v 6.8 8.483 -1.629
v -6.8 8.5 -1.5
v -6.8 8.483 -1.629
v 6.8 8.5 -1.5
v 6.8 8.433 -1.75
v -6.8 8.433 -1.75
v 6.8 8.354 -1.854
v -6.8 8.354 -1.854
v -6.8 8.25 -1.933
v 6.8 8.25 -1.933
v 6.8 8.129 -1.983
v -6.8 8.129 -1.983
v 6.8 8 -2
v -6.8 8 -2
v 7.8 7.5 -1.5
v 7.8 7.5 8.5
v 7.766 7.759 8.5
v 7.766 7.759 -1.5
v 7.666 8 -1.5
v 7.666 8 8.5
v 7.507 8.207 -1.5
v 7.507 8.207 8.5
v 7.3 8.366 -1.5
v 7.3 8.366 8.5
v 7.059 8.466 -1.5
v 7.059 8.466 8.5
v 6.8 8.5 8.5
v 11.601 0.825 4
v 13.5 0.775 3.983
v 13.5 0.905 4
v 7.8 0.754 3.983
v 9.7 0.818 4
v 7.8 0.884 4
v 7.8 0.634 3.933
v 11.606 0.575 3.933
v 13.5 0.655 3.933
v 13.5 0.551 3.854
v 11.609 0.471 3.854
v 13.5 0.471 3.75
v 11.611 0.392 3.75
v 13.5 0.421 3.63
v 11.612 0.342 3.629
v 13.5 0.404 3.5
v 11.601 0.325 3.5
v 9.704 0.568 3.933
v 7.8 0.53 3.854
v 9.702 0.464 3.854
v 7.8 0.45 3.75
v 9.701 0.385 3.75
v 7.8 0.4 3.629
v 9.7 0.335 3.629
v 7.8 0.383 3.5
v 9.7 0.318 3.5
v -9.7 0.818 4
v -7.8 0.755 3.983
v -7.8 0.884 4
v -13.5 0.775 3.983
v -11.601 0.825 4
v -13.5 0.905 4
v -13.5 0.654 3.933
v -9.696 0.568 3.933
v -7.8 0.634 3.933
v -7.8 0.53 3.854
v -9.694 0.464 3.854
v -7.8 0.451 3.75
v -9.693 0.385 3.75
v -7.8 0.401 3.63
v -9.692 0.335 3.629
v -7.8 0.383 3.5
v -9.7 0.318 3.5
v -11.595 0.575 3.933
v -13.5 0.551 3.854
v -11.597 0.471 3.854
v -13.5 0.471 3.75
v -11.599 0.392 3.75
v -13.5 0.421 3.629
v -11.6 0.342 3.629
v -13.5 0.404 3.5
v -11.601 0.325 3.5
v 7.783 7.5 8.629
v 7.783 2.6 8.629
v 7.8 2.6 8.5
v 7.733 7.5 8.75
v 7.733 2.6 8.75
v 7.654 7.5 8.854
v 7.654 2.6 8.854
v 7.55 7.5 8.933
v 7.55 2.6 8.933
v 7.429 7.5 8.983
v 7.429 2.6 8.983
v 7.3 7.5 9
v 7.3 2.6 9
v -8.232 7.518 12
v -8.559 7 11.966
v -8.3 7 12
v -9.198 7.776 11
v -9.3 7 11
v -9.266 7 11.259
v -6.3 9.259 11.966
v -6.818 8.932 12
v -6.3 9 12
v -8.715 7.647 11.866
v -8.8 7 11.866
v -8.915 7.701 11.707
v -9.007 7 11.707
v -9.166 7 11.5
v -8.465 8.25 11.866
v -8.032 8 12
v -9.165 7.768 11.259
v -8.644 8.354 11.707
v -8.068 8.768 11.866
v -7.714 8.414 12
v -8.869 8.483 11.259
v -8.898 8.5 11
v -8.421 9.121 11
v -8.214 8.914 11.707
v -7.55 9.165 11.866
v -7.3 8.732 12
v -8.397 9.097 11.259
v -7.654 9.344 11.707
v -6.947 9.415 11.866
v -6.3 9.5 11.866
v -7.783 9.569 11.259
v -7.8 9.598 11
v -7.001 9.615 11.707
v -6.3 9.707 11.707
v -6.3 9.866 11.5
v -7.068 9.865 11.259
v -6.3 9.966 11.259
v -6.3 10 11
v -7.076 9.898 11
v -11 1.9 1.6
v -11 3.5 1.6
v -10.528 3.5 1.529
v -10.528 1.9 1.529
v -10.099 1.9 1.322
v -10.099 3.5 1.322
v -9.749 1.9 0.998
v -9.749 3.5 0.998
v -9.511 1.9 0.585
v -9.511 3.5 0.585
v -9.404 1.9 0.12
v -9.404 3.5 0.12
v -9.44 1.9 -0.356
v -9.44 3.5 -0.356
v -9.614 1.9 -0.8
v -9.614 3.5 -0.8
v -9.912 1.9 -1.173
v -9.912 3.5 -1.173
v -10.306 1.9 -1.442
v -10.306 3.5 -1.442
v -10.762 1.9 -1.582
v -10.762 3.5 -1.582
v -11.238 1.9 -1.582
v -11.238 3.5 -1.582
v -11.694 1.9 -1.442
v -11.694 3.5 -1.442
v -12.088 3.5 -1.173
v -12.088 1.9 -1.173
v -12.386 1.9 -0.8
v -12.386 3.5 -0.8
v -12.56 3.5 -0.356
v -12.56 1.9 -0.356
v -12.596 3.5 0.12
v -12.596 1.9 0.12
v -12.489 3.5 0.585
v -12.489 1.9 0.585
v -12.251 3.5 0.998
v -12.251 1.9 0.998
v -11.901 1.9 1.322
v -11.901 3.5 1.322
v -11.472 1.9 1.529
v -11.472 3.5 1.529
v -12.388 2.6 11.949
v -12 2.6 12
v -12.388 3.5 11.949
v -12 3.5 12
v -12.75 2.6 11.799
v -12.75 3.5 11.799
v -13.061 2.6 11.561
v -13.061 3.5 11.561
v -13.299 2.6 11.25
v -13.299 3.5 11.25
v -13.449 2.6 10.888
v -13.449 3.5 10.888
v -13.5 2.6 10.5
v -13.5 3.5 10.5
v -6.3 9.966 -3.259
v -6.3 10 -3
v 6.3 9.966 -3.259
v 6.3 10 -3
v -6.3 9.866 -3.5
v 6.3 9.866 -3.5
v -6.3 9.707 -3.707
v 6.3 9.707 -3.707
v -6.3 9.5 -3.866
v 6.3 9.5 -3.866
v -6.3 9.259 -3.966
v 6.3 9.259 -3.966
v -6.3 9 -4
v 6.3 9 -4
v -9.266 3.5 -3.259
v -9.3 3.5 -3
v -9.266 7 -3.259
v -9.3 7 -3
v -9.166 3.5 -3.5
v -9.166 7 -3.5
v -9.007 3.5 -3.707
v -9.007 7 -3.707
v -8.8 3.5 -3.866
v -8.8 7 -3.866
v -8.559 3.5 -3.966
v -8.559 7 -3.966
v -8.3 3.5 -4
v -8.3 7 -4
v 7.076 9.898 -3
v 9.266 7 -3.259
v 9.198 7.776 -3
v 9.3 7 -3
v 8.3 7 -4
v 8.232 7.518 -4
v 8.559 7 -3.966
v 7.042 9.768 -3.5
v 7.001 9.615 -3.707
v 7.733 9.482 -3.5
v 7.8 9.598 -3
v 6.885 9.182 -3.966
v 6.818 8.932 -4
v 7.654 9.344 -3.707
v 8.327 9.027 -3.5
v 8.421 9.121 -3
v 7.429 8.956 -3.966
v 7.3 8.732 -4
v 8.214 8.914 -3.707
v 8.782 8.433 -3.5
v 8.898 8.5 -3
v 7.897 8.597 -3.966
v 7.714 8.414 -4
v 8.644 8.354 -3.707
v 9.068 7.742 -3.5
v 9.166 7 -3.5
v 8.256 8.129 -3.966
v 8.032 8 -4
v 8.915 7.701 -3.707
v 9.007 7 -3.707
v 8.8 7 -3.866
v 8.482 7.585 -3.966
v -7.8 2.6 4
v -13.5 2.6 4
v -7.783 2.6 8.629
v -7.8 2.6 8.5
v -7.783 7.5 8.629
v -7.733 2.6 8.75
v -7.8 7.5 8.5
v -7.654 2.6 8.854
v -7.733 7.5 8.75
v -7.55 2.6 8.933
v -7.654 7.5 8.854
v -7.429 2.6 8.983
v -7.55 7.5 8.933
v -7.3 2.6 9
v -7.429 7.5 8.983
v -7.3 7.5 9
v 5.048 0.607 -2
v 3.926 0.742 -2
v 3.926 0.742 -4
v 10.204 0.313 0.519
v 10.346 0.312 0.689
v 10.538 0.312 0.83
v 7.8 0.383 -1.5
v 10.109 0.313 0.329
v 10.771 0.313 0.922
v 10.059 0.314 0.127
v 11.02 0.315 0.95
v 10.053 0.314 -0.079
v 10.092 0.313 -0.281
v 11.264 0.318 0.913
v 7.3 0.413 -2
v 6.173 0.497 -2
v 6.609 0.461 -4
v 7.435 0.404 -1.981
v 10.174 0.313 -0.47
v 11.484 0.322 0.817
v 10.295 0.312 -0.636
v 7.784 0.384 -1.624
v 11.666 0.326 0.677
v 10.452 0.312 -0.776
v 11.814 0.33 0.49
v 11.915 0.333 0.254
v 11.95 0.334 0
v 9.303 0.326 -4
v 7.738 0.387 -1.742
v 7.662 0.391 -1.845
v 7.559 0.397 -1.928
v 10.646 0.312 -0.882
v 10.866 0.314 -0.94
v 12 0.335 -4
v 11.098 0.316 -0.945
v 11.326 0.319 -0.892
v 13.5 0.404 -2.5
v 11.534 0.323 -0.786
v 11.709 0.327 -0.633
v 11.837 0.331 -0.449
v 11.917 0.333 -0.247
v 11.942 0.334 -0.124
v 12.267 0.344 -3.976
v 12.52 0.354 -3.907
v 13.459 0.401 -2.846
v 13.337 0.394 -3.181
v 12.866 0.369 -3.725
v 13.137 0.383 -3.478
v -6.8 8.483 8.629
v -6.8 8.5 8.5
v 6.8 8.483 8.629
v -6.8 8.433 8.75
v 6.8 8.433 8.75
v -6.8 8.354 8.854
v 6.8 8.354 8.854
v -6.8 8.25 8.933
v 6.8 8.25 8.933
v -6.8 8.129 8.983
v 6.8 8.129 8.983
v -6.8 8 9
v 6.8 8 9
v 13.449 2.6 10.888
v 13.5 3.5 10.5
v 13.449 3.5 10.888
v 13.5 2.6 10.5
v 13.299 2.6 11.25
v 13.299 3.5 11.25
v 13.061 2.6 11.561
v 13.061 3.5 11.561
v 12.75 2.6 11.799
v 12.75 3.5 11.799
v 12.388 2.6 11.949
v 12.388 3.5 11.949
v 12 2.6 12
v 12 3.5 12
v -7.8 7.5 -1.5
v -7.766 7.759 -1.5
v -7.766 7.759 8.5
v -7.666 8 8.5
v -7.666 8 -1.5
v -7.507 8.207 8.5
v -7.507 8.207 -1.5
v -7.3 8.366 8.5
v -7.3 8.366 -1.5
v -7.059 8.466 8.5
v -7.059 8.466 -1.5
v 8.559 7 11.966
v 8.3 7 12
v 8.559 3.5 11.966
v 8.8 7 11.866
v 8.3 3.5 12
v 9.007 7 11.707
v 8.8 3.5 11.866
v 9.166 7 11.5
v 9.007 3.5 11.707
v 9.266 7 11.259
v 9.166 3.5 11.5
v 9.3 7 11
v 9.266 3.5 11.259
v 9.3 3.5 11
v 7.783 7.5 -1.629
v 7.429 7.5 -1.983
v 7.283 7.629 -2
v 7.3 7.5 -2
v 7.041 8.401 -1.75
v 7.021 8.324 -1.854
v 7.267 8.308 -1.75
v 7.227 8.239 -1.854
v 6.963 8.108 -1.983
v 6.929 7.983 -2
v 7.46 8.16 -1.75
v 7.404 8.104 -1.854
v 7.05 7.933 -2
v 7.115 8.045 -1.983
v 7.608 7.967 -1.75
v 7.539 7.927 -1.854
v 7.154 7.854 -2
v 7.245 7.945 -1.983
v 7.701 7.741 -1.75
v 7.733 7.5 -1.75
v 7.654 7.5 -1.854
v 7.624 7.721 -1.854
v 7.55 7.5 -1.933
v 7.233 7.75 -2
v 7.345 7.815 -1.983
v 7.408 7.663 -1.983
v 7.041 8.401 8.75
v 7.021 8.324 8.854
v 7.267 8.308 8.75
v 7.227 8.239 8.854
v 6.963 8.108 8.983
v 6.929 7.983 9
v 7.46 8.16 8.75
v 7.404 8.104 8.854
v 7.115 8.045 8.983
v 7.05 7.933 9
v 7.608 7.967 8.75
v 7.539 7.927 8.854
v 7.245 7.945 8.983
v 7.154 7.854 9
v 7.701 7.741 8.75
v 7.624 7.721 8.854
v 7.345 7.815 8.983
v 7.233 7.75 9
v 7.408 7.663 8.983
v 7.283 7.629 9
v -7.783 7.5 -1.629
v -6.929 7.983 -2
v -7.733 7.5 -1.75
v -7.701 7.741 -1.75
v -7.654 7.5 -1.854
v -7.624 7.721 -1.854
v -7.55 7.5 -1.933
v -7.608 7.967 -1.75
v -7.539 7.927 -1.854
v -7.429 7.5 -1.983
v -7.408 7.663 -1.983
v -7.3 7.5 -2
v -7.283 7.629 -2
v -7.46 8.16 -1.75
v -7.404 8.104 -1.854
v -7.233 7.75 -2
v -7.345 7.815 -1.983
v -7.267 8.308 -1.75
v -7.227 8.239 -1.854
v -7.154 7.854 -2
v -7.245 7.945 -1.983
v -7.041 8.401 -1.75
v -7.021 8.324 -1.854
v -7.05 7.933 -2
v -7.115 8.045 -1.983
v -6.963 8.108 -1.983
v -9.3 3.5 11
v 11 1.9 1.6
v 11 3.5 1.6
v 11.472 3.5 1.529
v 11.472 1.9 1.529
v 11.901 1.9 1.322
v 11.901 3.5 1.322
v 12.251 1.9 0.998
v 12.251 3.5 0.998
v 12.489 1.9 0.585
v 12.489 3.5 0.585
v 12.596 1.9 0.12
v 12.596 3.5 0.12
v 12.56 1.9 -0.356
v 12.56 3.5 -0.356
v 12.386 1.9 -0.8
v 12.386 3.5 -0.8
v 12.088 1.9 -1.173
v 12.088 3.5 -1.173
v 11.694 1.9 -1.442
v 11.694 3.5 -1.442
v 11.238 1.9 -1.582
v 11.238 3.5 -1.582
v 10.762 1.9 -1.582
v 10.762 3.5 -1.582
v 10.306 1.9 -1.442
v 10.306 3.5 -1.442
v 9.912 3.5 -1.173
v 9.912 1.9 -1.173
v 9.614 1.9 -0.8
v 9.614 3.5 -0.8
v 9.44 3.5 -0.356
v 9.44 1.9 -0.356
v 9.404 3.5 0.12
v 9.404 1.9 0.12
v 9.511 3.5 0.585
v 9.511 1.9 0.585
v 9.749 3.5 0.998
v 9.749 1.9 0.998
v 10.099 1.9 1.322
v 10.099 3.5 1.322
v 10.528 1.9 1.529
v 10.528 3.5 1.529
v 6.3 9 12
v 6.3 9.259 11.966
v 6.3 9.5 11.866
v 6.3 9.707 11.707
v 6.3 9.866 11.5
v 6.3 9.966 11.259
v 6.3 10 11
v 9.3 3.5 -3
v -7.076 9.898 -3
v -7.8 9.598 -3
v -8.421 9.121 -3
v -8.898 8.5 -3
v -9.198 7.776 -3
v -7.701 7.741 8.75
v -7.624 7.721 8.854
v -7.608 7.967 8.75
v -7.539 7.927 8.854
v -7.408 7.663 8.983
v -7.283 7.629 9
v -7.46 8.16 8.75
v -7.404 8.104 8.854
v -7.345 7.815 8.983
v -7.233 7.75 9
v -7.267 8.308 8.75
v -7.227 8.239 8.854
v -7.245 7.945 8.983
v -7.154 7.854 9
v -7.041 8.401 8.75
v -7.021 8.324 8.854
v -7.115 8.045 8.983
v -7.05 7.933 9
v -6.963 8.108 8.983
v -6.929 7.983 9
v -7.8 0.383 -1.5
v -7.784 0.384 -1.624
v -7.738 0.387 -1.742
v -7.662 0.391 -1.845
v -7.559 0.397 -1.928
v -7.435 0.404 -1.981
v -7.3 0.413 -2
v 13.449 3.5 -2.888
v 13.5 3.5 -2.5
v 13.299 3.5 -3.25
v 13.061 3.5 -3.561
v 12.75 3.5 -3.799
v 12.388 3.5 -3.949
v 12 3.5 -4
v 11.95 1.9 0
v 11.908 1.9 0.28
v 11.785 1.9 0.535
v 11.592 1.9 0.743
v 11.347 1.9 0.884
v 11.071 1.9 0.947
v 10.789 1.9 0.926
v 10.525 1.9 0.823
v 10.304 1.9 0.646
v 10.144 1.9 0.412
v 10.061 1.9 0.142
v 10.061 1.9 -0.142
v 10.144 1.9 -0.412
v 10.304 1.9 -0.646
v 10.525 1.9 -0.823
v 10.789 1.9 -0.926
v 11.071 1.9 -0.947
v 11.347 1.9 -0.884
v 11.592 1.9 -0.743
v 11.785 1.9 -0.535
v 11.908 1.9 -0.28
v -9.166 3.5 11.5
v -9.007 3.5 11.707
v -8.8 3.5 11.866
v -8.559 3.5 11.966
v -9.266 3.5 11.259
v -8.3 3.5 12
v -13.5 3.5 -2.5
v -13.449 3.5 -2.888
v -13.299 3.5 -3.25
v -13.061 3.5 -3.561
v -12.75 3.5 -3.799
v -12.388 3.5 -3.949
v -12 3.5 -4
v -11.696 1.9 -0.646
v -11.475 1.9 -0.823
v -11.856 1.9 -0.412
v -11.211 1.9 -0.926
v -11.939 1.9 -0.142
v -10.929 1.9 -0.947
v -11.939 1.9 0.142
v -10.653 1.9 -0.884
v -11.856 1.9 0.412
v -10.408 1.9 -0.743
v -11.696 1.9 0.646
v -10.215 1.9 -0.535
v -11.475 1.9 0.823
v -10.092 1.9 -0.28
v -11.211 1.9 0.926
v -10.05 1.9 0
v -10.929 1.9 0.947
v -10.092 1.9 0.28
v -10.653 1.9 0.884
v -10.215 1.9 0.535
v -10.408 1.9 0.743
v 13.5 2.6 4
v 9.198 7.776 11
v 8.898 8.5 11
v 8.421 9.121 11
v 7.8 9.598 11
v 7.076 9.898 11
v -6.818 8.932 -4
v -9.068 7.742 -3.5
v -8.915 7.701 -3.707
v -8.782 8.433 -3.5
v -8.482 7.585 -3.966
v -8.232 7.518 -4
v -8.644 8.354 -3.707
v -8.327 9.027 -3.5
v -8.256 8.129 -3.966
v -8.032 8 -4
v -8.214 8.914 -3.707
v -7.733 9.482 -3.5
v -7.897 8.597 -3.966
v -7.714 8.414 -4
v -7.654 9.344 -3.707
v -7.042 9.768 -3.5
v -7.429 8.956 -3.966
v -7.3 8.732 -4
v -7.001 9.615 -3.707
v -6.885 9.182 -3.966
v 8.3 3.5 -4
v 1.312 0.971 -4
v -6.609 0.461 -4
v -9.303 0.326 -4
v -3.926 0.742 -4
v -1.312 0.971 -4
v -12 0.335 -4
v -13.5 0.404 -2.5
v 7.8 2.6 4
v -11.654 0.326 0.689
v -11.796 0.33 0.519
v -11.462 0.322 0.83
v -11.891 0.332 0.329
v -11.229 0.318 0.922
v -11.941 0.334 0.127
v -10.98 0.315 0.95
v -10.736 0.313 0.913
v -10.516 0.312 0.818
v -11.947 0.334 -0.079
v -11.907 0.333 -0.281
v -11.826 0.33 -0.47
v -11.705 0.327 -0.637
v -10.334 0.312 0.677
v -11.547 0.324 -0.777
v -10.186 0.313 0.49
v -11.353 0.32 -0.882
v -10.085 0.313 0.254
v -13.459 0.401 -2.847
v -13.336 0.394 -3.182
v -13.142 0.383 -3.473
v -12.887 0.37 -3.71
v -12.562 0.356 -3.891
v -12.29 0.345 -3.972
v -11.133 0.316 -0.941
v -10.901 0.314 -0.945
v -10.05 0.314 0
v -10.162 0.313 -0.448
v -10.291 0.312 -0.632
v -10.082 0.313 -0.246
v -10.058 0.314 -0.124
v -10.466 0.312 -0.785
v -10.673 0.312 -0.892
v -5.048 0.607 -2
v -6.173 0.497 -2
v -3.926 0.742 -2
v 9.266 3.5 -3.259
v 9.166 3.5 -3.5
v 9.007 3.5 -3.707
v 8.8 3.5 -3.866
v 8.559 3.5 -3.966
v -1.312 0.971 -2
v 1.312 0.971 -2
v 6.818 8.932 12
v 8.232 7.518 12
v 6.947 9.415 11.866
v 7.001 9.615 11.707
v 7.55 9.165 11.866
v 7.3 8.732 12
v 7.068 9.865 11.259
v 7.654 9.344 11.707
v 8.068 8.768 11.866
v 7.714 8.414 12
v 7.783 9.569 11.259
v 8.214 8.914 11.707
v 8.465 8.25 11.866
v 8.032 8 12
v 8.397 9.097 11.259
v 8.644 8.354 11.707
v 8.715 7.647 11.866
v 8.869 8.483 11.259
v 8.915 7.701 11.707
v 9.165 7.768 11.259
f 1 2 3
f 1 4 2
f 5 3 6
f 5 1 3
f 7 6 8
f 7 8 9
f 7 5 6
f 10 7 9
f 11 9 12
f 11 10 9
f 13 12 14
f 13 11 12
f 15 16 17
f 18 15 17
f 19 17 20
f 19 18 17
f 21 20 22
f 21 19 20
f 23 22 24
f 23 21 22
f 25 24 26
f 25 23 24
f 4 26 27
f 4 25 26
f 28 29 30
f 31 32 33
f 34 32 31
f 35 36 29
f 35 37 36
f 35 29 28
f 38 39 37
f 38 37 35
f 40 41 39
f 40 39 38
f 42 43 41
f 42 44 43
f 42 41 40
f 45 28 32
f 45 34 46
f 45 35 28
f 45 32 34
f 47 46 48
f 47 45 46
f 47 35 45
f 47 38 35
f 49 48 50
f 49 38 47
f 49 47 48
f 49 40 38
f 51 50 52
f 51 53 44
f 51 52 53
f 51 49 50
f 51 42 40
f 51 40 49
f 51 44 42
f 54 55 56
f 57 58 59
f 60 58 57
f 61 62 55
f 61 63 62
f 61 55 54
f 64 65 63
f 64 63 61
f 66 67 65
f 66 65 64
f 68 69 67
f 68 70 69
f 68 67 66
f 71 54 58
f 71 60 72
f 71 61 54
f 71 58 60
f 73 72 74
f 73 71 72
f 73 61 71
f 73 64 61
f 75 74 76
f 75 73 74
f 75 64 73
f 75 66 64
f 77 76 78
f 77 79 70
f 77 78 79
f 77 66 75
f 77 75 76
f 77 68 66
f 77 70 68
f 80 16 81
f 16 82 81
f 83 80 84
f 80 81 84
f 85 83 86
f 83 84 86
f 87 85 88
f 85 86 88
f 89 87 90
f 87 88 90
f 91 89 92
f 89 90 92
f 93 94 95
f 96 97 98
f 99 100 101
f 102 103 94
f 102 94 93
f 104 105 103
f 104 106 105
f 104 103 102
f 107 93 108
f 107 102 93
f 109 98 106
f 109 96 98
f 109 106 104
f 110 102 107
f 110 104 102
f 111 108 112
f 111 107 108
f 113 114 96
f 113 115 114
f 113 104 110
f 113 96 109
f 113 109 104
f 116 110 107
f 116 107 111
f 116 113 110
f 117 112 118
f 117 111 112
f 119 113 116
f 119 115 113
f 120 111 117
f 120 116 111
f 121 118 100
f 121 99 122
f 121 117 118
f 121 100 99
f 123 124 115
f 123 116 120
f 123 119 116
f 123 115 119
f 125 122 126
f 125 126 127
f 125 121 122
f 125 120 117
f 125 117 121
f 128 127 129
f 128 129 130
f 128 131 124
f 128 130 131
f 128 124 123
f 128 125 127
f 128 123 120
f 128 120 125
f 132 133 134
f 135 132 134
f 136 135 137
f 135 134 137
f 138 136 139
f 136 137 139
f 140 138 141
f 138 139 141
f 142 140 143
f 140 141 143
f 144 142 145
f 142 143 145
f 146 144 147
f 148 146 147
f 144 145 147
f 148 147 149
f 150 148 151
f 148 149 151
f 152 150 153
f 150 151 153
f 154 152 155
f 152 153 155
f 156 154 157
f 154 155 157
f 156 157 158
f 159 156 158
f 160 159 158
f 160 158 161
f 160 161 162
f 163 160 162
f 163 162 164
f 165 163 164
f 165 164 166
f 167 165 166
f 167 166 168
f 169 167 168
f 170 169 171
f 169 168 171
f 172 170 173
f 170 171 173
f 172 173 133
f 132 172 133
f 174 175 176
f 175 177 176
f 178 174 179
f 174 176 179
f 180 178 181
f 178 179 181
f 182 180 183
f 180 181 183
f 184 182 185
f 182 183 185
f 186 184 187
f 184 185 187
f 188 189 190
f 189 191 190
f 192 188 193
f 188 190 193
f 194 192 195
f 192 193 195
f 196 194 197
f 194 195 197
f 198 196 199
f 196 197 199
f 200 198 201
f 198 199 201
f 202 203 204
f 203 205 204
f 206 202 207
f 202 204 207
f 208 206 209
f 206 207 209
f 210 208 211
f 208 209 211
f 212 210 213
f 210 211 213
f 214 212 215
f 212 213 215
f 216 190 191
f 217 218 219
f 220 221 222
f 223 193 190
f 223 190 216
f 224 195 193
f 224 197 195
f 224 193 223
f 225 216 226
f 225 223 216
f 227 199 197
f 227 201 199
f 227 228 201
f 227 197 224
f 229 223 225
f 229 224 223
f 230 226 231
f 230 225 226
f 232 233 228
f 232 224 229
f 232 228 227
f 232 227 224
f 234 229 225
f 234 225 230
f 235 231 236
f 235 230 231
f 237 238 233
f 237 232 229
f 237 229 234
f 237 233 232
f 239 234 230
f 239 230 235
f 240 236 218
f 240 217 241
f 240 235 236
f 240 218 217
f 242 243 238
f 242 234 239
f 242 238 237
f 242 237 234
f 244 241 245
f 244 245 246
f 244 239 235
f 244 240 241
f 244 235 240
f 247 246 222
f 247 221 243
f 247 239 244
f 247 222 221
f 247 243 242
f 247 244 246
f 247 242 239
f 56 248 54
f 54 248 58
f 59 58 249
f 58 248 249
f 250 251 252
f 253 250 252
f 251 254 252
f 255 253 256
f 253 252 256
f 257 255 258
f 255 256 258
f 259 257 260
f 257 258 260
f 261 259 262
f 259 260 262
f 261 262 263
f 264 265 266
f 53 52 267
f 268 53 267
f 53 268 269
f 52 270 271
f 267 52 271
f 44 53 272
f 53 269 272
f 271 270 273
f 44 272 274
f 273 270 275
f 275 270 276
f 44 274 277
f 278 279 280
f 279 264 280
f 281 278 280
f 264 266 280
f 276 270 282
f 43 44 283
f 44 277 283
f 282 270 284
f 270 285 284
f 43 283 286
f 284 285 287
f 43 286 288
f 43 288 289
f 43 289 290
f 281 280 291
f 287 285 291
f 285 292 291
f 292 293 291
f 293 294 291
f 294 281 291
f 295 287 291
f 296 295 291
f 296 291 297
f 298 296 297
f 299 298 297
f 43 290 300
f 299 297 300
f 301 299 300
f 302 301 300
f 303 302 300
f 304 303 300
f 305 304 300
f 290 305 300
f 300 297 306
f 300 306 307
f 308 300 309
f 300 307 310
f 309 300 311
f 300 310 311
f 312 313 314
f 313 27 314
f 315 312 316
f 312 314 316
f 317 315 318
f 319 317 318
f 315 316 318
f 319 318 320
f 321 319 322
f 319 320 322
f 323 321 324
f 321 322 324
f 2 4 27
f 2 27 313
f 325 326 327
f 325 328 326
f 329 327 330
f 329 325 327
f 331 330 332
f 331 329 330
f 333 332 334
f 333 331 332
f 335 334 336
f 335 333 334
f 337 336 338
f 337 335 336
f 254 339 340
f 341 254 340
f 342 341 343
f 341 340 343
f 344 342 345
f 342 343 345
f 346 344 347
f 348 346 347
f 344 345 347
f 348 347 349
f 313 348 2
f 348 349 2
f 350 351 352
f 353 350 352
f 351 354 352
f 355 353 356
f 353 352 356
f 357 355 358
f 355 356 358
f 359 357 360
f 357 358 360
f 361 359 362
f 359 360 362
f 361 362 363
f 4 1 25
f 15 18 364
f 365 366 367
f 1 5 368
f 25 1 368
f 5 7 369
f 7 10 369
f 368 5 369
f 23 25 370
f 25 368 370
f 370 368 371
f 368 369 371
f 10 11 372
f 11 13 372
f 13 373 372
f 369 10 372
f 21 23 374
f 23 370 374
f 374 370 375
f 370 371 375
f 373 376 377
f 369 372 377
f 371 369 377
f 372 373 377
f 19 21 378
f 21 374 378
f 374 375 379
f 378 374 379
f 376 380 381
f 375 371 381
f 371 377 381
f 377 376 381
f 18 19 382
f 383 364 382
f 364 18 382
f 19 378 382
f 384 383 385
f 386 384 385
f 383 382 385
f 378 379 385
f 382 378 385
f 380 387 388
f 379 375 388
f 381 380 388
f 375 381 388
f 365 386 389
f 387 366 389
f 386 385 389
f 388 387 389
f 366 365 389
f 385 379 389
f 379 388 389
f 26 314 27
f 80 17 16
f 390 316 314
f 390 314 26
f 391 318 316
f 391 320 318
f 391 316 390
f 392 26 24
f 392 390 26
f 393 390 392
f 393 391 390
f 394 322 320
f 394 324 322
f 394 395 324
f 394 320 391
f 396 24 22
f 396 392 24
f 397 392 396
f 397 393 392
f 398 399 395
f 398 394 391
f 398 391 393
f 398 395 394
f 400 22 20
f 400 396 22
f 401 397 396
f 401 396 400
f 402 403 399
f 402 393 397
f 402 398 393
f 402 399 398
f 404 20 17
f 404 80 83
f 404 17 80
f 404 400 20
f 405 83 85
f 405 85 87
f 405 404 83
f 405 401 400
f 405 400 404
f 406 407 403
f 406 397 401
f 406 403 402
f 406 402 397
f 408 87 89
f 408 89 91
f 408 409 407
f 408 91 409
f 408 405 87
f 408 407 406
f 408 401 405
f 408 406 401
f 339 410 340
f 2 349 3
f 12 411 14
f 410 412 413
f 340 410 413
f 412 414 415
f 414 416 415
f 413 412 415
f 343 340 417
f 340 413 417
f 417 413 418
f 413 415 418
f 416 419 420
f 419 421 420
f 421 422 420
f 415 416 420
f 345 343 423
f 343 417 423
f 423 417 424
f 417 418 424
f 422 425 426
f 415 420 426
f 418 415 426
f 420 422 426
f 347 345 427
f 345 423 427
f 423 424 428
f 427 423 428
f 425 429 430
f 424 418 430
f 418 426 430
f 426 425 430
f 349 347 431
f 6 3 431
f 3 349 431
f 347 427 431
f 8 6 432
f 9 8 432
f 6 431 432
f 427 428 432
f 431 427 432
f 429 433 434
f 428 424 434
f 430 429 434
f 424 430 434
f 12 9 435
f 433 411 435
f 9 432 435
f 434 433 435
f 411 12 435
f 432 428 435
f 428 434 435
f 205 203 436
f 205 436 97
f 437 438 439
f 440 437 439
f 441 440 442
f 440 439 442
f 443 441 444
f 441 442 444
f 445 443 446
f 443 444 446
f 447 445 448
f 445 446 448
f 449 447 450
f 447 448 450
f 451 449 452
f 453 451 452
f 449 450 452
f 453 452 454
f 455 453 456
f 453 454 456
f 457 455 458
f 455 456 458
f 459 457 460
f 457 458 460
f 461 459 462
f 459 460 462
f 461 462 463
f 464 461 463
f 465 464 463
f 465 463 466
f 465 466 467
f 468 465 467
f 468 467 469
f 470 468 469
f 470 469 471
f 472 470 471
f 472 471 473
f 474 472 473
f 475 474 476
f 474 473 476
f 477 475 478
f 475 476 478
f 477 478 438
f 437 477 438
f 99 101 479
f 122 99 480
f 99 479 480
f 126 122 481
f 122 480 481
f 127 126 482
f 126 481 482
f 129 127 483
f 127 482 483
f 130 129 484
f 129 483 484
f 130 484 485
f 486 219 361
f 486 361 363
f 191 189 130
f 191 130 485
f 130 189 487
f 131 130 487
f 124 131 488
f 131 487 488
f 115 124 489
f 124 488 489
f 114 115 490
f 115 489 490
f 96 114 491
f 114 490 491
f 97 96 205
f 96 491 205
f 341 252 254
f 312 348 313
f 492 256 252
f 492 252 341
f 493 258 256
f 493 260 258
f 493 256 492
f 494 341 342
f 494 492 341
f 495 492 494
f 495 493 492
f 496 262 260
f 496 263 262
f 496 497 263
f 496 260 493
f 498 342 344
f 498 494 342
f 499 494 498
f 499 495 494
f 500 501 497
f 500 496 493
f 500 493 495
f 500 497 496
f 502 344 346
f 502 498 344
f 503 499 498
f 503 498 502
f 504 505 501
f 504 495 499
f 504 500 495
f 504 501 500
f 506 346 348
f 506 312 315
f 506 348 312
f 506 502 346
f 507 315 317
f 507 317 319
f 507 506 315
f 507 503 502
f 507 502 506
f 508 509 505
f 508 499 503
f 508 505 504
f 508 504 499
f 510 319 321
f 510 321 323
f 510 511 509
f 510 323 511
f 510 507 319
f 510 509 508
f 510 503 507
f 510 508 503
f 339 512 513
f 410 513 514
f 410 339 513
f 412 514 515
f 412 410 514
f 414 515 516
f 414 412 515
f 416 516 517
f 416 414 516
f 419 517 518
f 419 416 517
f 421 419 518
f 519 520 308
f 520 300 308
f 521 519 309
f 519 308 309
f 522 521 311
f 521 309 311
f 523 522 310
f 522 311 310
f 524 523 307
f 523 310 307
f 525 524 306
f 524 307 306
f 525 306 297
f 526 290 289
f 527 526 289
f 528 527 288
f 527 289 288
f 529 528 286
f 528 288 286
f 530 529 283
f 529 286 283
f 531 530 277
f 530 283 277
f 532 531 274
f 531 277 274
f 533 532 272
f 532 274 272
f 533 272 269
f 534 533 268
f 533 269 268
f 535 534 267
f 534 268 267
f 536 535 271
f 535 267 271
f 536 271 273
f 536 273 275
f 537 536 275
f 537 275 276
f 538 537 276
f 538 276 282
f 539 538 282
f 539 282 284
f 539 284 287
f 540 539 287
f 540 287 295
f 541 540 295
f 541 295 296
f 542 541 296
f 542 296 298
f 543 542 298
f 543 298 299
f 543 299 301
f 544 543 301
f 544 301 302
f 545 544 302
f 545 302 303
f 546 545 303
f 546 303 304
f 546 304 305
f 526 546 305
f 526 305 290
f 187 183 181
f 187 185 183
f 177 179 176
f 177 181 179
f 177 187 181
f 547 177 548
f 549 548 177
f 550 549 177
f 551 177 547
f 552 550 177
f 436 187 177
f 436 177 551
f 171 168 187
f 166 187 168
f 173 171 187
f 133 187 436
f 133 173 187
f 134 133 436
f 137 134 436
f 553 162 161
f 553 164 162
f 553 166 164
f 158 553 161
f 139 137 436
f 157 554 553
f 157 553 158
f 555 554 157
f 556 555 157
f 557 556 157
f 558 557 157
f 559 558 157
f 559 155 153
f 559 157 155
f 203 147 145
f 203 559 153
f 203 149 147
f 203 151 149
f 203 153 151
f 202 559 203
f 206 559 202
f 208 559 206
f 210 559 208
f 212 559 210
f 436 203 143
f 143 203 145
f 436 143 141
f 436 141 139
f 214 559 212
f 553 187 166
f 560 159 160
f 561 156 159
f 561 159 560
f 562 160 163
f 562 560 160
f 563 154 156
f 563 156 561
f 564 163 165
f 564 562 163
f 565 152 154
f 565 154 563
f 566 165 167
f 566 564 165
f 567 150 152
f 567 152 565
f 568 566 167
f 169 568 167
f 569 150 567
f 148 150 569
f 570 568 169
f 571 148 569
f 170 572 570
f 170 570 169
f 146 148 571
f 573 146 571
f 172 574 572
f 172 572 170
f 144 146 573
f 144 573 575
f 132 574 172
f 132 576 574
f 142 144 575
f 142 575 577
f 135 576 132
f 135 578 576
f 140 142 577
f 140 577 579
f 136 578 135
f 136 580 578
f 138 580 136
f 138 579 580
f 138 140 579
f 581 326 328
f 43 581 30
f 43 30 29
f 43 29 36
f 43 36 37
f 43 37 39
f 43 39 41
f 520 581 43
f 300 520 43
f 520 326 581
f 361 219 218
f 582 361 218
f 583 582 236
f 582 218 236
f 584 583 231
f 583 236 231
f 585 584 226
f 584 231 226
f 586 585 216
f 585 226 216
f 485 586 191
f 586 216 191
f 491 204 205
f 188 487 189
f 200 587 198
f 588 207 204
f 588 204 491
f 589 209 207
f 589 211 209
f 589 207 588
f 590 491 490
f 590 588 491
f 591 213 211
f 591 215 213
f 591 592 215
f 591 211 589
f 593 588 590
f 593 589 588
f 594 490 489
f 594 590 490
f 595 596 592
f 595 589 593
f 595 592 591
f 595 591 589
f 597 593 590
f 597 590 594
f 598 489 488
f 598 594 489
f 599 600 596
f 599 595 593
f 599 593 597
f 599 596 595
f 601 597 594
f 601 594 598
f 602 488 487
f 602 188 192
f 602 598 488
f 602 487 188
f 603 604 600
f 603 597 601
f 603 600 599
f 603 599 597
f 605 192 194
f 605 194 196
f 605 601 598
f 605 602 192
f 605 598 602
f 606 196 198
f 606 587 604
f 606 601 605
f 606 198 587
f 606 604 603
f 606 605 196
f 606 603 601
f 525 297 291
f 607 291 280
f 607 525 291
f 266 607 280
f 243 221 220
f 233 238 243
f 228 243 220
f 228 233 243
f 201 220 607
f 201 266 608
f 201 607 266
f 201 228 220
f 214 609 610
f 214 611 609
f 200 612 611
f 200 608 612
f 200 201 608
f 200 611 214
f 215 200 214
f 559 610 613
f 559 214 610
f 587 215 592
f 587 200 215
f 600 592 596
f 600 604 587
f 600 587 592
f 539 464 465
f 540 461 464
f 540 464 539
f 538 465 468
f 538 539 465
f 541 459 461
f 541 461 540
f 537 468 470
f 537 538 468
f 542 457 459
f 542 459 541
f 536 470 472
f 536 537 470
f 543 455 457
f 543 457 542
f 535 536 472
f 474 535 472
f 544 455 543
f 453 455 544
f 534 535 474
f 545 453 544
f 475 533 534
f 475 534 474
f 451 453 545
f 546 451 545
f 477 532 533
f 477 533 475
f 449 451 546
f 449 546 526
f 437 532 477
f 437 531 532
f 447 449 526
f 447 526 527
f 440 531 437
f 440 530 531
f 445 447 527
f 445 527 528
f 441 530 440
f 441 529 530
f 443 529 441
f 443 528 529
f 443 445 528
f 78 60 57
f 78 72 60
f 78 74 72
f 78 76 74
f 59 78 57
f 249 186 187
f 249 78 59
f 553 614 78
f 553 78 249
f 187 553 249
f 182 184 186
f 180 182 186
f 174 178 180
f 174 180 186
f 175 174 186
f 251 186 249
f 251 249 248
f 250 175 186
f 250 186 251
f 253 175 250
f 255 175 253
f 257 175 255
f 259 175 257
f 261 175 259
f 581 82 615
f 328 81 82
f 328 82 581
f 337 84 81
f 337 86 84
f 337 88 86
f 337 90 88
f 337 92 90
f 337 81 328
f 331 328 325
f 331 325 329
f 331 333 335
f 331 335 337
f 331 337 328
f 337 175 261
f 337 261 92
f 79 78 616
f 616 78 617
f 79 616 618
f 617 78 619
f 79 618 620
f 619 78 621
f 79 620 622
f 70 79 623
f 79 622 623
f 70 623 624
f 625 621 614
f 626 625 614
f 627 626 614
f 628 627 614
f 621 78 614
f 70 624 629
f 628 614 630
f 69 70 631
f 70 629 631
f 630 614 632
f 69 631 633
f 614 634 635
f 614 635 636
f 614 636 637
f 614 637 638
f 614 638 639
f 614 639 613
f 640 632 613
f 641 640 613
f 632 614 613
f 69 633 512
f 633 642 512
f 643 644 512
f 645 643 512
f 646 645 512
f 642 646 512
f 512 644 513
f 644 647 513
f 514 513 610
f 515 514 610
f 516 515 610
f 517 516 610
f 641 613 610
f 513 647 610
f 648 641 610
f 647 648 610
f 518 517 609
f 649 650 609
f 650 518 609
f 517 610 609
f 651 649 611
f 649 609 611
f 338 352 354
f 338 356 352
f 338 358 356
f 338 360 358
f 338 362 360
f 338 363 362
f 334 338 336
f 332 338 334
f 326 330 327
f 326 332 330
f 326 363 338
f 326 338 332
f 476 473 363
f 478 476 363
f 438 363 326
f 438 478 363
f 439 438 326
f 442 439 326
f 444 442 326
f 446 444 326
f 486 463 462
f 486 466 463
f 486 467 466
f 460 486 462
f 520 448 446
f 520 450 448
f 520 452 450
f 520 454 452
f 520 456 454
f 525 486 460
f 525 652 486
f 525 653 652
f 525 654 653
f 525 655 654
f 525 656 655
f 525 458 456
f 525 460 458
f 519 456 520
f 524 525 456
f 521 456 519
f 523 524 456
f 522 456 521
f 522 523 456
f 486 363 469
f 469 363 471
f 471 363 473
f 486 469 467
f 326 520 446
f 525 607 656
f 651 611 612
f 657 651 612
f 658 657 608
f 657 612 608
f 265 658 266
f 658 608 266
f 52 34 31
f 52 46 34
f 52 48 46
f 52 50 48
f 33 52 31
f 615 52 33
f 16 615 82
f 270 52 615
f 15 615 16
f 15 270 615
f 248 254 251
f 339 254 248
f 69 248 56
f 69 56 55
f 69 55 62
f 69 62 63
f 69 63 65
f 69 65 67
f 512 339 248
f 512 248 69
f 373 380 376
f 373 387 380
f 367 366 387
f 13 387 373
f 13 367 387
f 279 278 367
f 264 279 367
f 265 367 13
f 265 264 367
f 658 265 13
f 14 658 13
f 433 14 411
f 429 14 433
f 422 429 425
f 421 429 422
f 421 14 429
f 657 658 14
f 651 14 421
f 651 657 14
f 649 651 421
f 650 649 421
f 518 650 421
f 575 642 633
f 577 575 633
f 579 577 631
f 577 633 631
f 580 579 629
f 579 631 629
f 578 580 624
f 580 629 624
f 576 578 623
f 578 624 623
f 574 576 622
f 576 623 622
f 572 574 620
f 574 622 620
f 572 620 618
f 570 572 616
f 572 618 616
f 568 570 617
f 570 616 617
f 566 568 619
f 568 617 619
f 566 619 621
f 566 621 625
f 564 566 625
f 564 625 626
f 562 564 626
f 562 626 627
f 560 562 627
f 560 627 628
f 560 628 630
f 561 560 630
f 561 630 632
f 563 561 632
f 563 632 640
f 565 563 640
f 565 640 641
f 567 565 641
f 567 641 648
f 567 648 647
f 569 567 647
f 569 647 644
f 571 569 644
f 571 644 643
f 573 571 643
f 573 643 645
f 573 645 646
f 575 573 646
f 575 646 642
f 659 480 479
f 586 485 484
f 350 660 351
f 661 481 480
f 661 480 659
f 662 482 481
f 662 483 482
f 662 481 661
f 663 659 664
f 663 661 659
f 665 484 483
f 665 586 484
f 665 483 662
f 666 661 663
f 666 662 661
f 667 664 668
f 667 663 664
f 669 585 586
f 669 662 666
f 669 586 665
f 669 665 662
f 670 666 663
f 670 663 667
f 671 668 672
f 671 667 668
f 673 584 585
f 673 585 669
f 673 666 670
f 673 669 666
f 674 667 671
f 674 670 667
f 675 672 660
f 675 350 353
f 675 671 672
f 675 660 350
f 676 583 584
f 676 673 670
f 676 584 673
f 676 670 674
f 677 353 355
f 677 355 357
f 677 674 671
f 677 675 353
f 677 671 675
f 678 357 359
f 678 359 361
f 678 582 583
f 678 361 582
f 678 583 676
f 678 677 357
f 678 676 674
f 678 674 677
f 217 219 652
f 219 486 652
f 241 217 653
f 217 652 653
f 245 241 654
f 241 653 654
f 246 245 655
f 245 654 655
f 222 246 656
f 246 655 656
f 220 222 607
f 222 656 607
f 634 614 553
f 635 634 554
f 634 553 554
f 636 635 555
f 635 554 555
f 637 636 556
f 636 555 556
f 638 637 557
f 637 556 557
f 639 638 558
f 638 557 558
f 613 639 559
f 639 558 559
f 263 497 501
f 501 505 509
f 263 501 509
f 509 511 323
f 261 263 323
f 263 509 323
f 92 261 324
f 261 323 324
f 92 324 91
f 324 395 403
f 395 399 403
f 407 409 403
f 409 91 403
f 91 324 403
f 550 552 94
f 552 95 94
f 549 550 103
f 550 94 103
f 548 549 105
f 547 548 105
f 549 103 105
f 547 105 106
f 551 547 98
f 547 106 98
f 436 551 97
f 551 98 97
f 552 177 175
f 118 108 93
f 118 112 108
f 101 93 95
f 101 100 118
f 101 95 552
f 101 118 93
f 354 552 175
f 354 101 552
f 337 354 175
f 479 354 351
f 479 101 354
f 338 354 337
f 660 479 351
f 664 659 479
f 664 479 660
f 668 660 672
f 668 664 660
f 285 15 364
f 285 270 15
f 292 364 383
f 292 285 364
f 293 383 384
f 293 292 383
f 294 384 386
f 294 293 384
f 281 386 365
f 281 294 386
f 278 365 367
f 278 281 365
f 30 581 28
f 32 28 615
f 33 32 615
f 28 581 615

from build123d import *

# Parameters (mm, degrees)
EXTRUDE_1_DEPTH     = 4
CUT_EXTRUDE_1_REACH = 19.27
SKETCH_2_R          = 0.95
SKETCH_5_W          = 15.6
SKETCH_5_H          = 6
CUT_EXTRUDE_2_DEPTH = 8.5
CUT_EXTRUDE_4_DEPTH = 19.607794066
EXTRUDE_2_DEPTH     = 8
SKETCH_12_W         = 15.6
SKETCH_12_H         = 3
EXTRUDE_3_DEPTH     = 5.9
SKETCH_13_R         = 1.6
CUT_EXTRUDE_5_DEPTH = 1.6
FILLET_1_R          = 3
FILLET_2_R          = 1
FILLET_3_R          = 1.5
FILLET_4_R          = 1
FILLET_5_R          = 0.5
FILLET_6_R          = 0.5


with BuildPart() as part:
    # 草图1 → 凸台-拉伸1 (new, symmetric)
    with BuildSketch(Plane.XY):
        Polygon((-13.5, 0), (-13.5, 3.5), (-9.3, 3.5), (-9.3, 10), (9.3, 10), (9.3, 3.5), (13.5, 3.5), (13.5, 0), align=None)
    extrude(amount=EXTRUDE_1_DEPTH, both=True)

    # 草图2 → 切除-拉伸1 (cut, up to next)
    with BuildSketch(Plane.XZ, mode=Mode.PRIVATE) as cut_extrude_1_sk1:
        with Locations((-11, 0)):
            Circle(SKETCH_2_R)
    cut_extrude_1_tool1 = extrude(cut_extrude_1_sk1.sketch, amount=-CUT_EXTRUDE_1_REACH, mode=Mode.PRIVATE) & part.part
    # 草图2 → 切除-拉伸1 (cut, up to next)
    with BuildSketch(Plane.XZ, mode=Mode.PRIVATE) as cut_extrude_1_sk2:
        with Locations((11, 0)):
            Circle(SKETCH_2_R)
    cut_extrude_1_tool2 = extrude(cut_extrude_1_sk2.sketch, amount=-CUT_EXTRUDE_1_REACH, mode=Mode.PRIVATE) & part.part
    add(cut_extrude_1_tool1.solids().sort_by_distance((-11, 0, 0))[0], mode=Mode.SUBTRACT)
    add(cut_extrude_1_tool2.solids().sort_by_distance((11, 0, 0))[0], mode=Mode.SUBTRACT)

    # 草图5 → 切除-拉伸2 (cut)
    with BuildSketch(Plane(origin=(0, 0, 0), x_dir=(-1, 0, 0), z_dir=(0, -1, 0))):
        with Locations((0, -1)):
            Rectangle(SKETCH_5_W, SKETCH_5_H)
    extrude(amount=-CUT_EXTRUDE_2_DEPTH, mode=Mode.SUBTRACT)

    # 草图8 → 切除-拉伸4 (cut, through all)
    with BuildSketch(Plane(origin=(0, 0, -4), x_dir=(-1, 0, 0), z_dir=(0, 0, -1))):
        with BuildLine():
            Line((-18.493720414, 0.960055854), (-18.493720414, -4.039944146))
            Line((-18.493720414, -4.039944146), (18.493720414, -4.039944146))
            Line((18.493720414, -4.039944146), (18.493720414, 0.960055854))
            ThreePointArc((18.493720414, 0.960055854), (11.217877694, 0.317576425), (3.926064508, 0.741990812))
            ThreePointArc((3.926064508, 0.741990812), (0, 1), (-3.926064508, 0.741990812))
            ThreePointArc((-3.926064508, 0.741990812), (-11.217877694, 0.317576425), (-18.493720414, 0.960055854))
        make_face()
    extrude(amount=-CUT_EXTRUDE_4_DEPTH, mode=Mode.SUBTRACT)

    # 草图11 → 凸台-拉伸2 (add)
    with BuildSketch(Plane.XY.offset(4)):
        Polygon((13.5, 2.6), (7.8, 2.6), (7.8, 8.5), (-7.8, 8.5), (-7.8, 2.6), (-13.5, 2.6), (-13.5, 3.5), (-9.3, 3.5), (-9.3, 10), (9.3, 10), (9.3, 3.5), (13.5, 3.5), align=None)
    extrude(amount=EXTRUDE_2_DEPTH)

    # 草图12 → 凸台-拉伸3 (add)
    with BuildSketch(Plane.XZ.offset(-8.5)):
        with Locations((0, 10.5)):
            Rectangle(SKETCH_12_W, SKETCH_12_H)
    extrude(amount=EXTRUDE_3_DEPTH)

    # 草图13 → 切除-拉伸5 (cut)
    with BuildSketch(Plane(origin=(0, 3.5, 0), x_dir=(1, 0, 0), z_dir=(0, 1, 0))):
        with Locations(Location((-11, 0, 0), (0, 0, 270))):
            Circle(SKETCH_13_R)
        with Locations(Location((11, 0, 0), (0, 0, 270))):
            Circle(SKETCH_13_R)
    extrude(amount=-CUT_EXTRUDE_5_DEPTH, mode=Mode.SUBTRACT)

    # 圆角1
    fillet_1_edges = [part.edges().sort_by_distance(p)[0] for p in [
        (-9.3, 10, 4),
        (9.3, 10, 4),
    ]]
    fillet(fillet_1_edges, radius=FILLET_1_R)

    # 圆角2
    fillet_2_edges = [part.edges().sort_by_distance(p)[0] for p in [
        (7.8, 8.5, 3.5),
        (-7.8, 8.5, 3.5),
    ]]
    fillet(fillet_2_edges, radius=FILLET_2_R)

    # 圆角3
    fillet_3_edges = [part.edges().sort_by_distance(p)[0] for p in [
        (13.5, 3.05, 12),
        (-13.5, 3.05, 12),
        (13.5, 1.951949488, -4),
        (-13.5, 1.951949488, -4),
    ]]
    fillet(fillet_3_edges, radius=FILLET_3_R)

    # 圆角4
    fillet_4_edges = [part.edges().sort_by_distance(p)[0] for p in [
        (9.3, 5.25, -4),
        (9.3, 5.25, 12),
        (0, 10, -4),
        (0, 10, 12),
        (-9.3, 5.25, -4),
        (-8.421320344, 9.121320344, -4),
        (8.421320344, 9.121320344, -4),
        (-9.3, 5.25, 12),
        (-8.421320344, 9.121320344, 12),
        (8.421320344, 9.121320344, 12),
    ]]
    fillet(fillet_4_edges, radius=FILLET_4_R)

    # 圆角5
    fillet_5_edges = [part.edges().sort_by_distance(p)[0] for p in [
        (10.650293934, 0.312302345, 4),
        (-10.650293934, 0.312302345, 4),
    ]]
    fillet(fillet_5_edges, radius=FILLET_5_R)

    # 圆角6
    fillet_6_edges = [part.edges().sort_by_distance(p)[0] for p in [
        (7.8, 5.05, 9),
        (-7.8, 5.05, 9),
        (-7.8, 3.941644472, -2),
        (0, 8.5, 9),
        (7.507106781, 8.207106781, 9),
        (-7.507106781, 8.207106781, 9),
        (0, 8.5, -2),
        (7.8, 3.941644472, -2),
        (7.507106781, 8.207106781, -2),
        (-7.507106781, 8.207106781, -2),
    ]]
    fillet(fillet_6_edges, radius=FILLET_6_R)


solid = part.part
